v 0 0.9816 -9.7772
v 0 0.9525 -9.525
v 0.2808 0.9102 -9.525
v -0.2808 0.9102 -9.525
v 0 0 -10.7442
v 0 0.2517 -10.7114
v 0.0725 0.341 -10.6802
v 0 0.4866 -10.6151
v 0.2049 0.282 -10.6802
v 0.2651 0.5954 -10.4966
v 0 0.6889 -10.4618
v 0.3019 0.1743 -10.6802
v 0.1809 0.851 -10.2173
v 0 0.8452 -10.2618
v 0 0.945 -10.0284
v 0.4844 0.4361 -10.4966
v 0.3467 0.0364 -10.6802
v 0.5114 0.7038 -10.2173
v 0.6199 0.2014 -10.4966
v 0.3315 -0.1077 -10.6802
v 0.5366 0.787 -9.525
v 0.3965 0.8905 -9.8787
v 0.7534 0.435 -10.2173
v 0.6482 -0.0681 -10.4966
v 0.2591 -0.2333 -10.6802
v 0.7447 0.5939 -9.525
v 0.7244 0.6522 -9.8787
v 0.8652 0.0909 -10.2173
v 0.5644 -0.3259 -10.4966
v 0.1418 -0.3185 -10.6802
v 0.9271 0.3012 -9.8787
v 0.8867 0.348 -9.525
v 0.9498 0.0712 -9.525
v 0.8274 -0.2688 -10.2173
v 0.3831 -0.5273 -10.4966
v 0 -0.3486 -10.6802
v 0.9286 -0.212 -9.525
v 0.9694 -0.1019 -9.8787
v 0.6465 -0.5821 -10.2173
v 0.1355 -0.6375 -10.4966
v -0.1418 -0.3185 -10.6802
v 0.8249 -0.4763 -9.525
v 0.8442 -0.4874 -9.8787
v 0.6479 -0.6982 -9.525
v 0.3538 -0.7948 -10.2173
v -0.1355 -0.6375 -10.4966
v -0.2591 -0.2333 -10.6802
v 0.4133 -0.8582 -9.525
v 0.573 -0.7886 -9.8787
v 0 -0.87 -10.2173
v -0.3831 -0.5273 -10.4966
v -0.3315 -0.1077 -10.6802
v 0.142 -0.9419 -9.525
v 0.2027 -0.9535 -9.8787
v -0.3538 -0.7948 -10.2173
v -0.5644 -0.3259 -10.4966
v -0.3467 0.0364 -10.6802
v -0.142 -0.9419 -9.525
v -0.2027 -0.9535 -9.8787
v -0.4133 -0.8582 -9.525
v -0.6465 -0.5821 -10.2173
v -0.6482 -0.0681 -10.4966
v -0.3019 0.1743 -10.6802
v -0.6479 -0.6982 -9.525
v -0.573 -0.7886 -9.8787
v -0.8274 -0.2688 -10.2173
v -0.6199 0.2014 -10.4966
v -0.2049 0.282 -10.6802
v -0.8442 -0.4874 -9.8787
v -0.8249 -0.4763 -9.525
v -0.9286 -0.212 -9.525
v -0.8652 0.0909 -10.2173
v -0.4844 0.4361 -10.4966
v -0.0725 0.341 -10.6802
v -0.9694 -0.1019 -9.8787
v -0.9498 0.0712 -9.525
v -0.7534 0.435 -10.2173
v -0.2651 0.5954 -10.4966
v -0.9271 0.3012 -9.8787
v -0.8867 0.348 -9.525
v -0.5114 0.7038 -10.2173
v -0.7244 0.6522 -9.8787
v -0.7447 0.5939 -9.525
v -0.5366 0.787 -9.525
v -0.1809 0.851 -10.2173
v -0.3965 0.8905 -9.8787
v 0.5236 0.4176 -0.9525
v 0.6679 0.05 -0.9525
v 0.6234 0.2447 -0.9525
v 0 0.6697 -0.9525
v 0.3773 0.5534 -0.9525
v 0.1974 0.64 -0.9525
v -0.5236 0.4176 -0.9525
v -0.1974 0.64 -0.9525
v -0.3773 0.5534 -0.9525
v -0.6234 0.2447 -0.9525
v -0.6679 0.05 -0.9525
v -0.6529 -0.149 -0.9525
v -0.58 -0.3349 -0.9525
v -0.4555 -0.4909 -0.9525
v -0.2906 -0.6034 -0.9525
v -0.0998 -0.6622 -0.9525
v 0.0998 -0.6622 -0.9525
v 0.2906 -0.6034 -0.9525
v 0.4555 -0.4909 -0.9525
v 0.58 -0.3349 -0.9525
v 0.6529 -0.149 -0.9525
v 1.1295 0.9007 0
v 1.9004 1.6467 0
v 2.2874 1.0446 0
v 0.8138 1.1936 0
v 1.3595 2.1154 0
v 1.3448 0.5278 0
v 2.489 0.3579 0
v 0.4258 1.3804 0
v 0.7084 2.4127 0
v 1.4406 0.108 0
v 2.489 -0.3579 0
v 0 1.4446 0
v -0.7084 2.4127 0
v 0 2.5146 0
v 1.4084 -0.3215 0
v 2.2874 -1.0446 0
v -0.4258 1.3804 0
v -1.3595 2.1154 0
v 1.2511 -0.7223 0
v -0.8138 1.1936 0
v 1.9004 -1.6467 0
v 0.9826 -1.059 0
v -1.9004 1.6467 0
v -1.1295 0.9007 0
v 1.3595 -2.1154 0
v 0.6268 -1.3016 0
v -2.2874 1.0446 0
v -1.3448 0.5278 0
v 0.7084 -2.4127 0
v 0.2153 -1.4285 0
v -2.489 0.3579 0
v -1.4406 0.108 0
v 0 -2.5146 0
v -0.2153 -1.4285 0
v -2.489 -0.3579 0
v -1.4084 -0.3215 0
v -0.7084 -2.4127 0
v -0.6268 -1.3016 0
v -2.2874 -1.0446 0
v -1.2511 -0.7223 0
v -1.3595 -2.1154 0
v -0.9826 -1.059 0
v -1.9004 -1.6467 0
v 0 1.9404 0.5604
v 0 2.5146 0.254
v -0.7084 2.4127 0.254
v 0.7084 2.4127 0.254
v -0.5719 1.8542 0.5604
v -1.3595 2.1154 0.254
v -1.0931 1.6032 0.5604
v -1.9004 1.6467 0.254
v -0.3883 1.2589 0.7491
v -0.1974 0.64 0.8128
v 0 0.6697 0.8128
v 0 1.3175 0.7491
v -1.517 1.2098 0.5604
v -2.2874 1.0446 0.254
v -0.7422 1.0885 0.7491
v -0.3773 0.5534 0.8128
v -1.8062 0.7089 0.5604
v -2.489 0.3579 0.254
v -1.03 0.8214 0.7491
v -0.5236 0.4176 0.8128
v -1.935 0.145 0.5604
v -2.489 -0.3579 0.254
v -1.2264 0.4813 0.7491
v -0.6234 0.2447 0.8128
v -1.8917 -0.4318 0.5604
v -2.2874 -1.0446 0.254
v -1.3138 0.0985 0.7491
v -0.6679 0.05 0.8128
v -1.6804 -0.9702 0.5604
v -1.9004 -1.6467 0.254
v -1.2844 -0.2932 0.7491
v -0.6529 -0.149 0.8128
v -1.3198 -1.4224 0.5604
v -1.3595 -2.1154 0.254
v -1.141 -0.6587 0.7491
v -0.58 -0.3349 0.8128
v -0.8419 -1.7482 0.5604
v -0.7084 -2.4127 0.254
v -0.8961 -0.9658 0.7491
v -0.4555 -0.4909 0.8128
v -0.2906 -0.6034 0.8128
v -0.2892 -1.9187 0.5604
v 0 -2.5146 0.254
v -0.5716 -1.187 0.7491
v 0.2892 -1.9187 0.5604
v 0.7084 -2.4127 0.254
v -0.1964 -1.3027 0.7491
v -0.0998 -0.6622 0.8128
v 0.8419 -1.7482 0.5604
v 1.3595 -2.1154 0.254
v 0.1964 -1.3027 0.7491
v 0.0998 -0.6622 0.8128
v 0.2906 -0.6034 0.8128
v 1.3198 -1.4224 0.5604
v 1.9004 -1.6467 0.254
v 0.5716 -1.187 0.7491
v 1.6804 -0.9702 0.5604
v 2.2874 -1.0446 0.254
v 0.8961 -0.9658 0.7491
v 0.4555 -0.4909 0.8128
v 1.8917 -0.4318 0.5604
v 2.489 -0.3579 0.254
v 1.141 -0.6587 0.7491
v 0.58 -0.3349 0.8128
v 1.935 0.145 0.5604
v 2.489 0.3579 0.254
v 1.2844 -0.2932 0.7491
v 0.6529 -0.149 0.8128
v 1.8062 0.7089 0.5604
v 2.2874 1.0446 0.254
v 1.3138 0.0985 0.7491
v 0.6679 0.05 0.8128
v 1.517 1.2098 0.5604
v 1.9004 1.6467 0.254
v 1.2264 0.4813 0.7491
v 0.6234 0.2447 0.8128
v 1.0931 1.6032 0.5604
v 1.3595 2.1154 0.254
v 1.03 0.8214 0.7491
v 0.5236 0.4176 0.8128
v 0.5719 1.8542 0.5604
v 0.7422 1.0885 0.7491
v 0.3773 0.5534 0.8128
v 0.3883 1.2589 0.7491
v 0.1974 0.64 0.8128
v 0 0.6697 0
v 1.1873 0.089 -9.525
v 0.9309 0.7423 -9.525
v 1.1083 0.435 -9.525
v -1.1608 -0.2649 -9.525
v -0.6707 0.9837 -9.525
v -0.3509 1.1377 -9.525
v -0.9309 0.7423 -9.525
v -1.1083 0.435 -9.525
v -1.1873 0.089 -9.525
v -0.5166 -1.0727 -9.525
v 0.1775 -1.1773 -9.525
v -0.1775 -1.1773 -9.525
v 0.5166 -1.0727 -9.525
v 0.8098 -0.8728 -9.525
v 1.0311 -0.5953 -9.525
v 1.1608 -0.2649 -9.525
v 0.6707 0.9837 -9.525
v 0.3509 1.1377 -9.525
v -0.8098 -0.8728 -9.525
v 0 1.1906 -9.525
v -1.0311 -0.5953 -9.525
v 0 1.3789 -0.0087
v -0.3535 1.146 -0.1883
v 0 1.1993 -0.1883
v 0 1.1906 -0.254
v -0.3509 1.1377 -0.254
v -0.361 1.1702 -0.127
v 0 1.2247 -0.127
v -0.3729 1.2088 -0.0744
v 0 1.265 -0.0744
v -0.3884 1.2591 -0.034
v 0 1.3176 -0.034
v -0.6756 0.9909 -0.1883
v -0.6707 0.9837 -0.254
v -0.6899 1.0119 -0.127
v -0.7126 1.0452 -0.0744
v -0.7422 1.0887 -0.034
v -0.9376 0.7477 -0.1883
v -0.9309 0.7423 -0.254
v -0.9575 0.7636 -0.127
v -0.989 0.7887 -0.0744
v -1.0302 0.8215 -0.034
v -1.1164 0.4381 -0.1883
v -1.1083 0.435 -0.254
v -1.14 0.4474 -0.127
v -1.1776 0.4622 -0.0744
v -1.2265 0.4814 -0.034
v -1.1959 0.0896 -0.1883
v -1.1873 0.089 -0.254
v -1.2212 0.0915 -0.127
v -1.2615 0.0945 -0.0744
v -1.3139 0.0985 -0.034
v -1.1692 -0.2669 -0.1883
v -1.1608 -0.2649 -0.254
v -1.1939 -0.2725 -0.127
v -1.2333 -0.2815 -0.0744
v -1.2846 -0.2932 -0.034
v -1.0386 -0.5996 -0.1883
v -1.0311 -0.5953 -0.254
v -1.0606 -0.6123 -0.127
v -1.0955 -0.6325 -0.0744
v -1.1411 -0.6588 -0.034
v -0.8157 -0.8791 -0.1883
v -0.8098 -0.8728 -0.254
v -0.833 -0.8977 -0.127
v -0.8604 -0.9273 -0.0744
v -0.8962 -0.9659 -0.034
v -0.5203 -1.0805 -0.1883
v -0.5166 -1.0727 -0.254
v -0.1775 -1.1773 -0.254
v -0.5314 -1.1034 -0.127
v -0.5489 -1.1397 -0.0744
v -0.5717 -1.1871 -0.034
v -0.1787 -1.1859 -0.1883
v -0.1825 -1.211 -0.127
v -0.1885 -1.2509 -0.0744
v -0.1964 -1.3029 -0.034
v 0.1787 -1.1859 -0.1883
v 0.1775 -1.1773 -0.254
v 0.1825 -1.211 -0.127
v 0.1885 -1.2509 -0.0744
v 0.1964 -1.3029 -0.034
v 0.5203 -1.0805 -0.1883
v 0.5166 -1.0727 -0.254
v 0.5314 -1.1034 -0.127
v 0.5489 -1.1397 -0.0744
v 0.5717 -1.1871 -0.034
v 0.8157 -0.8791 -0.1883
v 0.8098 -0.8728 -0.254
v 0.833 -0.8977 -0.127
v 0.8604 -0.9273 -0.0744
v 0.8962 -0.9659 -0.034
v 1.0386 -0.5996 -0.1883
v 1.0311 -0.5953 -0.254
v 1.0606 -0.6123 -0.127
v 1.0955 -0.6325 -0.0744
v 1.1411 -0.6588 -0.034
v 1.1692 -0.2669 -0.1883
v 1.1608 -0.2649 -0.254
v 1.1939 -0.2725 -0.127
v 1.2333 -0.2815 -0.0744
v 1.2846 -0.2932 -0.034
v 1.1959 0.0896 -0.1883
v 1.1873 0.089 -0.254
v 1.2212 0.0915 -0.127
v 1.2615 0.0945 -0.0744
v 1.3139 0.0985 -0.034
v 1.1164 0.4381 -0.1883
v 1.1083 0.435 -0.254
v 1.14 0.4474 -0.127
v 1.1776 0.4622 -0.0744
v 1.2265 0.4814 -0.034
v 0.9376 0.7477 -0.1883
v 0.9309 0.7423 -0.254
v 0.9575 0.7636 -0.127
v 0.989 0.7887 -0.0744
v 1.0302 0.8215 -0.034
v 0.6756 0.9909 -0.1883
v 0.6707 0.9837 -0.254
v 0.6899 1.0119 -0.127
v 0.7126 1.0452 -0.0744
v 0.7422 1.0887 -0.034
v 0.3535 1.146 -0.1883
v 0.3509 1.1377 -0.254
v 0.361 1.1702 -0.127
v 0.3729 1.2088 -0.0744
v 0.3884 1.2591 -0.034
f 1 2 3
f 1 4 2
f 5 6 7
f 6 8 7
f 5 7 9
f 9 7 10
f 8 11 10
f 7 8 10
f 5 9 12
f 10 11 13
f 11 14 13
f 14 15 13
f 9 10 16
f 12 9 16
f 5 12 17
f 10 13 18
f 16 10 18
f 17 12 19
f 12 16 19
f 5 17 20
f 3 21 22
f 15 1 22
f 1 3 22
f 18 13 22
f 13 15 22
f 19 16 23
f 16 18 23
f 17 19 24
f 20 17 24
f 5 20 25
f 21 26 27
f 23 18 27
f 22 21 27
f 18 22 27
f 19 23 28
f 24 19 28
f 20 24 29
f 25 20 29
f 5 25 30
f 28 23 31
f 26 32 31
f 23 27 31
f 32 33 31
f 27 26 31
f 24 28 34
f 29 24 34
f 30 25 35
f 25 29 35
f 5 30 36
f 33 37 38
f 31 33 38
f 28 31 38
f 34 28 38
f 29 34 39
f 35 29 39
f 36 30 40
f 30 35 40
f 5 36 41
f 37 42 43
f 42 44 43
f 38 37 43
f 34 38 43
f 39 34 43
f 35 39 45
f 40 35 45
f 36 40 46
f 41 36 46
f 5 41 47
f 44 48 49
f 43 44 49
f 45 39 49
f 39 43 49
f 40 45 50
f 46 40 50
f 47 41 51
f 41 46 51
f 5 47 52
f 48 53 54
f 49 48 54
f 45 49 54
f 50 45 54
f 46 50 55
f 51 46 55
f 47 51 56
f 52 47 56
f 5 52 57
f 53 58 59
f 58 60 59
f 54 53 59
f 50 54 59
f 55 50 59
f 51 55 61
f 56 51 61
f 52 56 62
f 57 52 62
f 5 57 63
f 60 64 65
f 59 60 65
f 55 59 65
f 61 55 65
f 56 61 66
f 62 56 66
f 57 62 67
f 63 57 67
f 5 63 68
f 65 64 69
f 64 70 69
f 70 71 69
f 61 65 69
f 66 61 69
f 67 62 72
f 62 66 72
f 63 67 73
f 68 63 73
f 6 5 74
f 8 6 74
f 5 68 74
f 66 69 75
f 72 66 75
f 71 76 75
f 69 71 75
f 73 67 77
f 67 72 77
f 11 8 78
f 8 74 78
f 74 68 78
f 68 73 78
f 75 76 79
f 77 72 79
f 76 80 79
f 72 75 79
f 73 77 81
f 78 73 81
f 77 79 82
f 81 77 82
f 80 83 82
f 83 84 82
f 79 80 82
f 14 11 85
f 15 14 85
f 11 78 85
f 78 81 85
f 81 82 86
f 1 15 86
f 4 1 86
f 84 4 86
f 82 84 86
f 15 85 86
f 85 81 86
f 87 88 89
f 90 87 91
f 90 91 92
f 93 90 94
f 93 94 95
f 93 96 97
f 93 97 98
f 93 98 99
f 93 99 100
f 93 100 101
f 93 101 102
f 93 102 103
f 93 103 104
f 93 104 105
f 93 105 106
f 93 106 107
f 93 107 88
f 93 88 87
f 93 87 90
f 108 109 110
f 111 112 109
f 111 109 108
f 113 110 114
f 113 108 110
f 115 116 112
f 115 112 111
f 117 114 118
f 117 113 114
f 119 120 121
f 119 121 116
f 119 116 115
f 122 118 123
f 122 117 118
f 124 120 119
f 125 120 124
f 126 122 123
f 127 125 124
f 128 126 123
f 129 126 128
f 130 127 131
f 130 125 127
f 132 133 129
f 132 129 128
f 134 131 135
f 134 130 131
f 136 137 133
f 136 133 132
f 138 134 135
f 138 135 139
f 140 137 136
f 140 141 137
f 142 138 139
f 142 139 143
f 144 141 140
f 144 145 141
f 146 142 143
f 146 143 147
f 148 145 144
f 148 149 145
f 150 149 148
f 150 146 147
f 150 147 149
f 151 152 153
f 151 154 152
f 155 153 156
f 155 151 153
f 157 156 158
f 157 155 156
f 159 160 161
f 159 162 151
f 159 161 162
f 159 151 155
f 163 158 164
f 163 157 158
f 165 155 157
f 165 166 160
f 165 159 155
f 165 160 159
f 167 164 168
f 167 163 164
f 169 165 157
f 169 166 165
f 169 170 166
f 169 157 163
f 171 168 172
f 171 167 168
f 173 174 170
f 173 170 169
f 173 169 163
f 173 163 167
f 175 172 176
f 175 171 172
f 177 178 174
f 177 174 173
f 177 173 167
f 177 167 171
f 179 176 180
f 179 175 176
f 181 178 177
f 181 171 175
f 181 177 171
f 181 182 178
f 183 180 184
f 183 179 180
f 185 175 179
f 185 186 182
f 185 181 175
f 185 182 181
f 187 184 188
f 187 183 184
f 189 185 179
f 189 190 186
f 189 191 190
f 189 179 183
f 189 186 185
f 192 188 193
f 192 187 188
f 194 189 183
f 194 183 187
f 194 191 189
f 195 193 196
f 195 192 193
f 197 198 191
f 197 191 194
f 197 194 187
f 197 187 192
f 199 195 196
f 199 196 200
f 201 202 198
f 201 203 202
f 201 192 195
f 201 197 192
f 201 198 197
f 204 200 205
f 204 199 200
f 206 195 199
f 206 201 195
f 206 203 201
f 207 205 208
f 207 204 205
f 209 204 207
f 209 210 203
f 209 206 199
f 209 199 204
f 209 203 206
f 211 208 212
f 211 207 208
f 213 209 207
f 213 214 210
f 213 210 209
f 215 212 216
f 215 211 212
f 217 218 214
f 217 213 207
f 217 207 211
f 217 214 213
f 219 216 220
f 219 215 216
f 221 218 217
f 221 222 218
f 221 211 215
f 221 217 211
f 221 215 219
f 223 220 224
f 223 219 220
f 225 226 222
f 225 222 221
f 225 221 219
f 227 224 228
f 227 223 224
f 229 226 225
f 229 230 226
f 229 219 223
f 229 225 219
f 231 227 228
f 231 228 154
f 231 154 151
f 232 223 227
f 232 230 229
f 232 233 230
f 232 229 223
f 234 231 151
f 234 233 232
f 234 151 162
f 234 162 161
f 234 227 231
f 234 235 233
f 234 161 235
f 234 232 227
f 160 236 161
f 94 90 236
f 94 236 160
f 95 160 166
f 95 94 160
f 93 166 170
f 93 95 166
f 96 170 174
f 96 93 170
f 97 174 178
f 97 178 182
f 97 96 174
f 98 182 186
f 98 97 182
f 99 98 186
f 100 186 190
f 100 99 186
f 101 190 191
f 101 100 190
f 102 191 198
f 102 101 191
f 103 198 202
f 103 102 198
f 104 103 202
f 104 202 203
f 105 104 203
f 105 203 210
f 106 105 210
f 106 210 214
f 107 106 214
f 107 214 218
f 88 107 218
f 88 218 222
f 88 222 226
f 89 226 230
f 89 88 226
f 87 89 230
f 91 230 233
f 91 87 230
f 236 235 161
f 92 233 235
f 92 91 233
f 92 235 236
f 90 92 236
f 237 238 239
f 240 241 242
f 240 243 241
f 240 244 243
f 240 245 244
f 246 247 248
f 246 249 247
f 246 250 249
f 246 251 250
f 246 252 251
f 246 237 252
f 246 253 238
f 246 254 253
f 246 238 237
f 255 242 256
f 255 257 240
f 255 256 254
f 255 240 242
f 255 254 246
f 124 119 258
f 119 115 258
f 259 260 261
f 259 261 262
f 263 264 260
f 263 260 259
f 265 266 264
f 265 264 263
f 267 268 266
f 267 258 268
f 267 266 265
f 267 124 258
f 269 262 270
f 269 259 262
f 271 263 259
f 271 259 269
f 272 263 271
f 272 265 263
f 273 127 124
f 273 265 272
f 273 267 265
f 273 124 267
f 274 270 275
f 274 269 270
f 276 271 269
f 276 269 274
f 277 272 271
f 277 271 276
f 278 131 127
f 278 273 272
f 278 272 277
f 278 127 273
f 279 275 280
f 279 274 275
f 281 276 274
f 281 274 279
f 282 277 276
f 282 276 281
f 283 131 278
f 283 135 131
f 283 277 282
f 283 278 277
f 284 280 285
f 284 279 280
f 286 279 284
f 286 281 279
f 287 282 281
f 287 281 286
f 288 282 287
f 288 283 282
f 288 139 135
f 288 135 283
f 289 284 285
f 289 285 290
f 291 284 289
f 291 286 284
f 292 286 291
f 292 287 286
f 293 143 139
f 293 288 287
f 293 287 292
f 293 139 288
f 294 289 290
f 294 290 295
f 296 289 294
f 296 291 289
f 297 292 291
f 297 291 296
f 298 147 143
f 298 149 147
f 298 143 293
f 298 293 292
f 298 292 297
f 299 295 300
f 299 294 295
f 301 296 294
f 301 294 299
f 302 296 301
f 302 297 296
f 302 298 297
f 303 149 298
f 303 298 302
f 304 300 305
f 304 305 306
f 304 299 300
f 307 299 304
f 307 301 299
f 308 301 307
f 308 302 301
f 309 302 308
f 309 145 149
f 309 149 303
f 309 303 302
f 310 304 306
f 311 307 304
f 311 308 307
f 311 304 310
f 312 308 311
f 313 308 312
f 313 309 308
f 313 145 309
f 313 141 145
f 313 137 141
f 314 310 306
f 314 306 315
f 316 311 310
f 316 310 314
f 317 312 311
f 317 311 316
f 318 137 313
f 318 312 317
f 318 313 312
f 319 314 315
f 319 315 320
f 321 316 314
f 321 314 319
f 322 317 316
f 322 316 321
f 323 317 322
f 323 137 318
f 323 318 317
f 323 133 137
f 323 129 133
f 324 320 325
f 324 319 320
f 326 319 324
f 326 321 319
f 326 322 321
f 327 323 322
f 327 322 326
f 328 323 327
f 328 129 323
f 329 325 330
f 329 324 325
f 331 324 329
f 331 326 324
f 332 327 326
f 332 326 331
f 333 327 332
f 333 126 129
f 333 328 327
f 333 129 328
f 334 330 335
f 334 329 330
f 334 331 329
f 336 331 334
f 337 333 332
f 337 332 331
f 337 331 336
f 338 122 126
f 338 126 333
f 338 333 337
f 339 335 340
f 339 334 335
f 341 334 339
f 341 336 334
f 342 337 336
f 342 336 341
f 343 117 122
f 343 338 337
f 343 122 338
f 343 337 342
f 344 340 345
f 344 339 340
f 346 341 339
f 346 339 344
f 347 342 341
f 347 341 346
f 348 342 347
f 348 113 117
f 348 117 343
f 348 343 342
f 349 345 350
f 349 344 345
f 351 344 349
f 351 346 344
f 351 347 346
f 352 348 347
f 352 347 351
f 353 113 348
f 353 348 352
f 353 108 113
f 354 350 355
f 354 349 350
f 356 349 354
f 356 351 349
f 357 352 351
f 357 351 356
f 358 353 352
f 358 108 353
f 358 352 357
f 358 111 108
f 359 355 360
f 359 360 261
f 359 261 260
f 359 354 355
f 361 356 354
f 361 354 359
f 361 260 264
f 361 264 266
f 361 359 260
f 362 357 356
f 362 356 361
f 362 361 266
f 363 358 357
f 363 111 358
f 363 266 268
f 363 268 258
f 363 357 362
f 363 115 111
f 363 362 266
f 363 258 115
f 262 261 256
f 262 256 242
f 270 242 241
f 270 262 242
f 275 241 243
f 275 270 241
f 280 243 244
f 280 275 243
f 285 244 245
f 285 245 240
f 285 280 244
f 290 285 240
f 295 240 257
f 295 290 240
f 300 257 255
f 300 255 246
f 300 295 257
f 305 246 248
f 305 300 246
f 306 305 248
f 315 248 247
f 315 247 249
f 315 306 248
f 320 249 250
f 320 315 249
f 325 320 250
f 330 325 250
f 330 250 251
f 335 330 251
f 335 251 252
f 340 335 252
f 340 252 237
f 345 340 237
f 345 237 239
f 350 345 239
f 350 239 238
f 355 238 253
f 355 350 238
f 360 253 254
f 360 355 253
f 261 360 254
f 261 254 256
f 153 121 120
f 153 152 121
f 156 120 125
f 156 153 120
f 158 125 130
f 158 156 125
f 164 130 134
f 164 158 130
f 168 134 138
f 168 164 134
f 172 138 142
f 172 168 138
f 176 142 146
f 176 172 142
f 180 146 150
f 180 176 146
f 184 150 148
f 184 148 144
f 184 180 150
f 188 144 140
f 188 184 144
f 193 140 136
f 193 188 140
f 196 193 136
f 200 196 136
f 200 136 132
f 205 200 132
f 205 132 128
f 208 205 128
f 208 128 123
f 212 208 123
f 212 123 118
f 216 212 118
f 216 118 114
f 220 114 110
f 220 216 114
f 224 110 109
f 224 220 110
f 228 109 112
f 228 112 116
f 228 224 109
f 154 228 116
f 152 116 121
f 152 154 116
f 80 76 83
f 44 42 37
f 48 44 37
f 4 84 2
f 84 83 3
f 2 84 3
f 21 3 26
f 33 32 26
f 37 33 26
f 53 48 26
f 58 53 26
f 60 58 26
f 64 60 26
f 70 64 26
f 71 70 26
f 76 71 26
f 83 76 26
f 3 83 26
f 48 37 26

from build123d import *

# Parameters (mm, degrees)
FILLET2_R = 0.254


with BuildPart() as part:
    # Sketch2 → Revolve1 (revolve)
    with BuildSketch(Plane(origin=(0, 0, 0), x_dir=(0, 0, -1), z_dir=(1, 0, 0))):
        with BuildLine():
            Line((9.525, 1.190625), (0, 1.190625))
            Line((0, 1.190625), (0, 2.5146))
            Line((0, 2.5146), (-0.254, 2.5146))
            ThreePointArc((-0.254, 2.5146), (-0.670034887, 1.633549088), (-0.8128, 0.669726562))
            Line((-0.8128, 0.669726562), (0, 0.669726563))
            Line((0, 0.669726563), (0.9525, 0.669726563))
            Line((0.9525, 0.669726563), (0.9525, 0))
            Line((0.9525, 0), (9.525, 0))
            Line((9.525, 0), (9.525, 1.190625))
        make_face()
    revolve(axis=Axis((0, 0, -9.525), (0, 0, 1)))

    # Fillet2
    fillet2_edges = [part.edges().sort_by_distance(p)[0] for p in [
        (0, -1.190625, 0),
    ]]
    fillet(fillet2_edges, radius=FILLET2_R)


with BuildPart() as body_2:
    # Sketch8 → Revolve3 (revolve)
    with BuildSketch(Plane(origin=(0, 0, 0), x_dir=(0, 0, -1), z_dir=(1, 0, 0))):
        with BuildLine():
            Line((9.525, 0.9525), (9.525, 0))
            Line((9.525, 0), (10.7442, 0))
            ThreePointArc((10.7442, 0), (10.366889167, 0.773580133), (9.525, 0.9525))
        make_face()
    revolve(axis=Axis((0, 0, -9.525), (0, 0, -1)))


solid = Compound([part.part, body_2.part])
